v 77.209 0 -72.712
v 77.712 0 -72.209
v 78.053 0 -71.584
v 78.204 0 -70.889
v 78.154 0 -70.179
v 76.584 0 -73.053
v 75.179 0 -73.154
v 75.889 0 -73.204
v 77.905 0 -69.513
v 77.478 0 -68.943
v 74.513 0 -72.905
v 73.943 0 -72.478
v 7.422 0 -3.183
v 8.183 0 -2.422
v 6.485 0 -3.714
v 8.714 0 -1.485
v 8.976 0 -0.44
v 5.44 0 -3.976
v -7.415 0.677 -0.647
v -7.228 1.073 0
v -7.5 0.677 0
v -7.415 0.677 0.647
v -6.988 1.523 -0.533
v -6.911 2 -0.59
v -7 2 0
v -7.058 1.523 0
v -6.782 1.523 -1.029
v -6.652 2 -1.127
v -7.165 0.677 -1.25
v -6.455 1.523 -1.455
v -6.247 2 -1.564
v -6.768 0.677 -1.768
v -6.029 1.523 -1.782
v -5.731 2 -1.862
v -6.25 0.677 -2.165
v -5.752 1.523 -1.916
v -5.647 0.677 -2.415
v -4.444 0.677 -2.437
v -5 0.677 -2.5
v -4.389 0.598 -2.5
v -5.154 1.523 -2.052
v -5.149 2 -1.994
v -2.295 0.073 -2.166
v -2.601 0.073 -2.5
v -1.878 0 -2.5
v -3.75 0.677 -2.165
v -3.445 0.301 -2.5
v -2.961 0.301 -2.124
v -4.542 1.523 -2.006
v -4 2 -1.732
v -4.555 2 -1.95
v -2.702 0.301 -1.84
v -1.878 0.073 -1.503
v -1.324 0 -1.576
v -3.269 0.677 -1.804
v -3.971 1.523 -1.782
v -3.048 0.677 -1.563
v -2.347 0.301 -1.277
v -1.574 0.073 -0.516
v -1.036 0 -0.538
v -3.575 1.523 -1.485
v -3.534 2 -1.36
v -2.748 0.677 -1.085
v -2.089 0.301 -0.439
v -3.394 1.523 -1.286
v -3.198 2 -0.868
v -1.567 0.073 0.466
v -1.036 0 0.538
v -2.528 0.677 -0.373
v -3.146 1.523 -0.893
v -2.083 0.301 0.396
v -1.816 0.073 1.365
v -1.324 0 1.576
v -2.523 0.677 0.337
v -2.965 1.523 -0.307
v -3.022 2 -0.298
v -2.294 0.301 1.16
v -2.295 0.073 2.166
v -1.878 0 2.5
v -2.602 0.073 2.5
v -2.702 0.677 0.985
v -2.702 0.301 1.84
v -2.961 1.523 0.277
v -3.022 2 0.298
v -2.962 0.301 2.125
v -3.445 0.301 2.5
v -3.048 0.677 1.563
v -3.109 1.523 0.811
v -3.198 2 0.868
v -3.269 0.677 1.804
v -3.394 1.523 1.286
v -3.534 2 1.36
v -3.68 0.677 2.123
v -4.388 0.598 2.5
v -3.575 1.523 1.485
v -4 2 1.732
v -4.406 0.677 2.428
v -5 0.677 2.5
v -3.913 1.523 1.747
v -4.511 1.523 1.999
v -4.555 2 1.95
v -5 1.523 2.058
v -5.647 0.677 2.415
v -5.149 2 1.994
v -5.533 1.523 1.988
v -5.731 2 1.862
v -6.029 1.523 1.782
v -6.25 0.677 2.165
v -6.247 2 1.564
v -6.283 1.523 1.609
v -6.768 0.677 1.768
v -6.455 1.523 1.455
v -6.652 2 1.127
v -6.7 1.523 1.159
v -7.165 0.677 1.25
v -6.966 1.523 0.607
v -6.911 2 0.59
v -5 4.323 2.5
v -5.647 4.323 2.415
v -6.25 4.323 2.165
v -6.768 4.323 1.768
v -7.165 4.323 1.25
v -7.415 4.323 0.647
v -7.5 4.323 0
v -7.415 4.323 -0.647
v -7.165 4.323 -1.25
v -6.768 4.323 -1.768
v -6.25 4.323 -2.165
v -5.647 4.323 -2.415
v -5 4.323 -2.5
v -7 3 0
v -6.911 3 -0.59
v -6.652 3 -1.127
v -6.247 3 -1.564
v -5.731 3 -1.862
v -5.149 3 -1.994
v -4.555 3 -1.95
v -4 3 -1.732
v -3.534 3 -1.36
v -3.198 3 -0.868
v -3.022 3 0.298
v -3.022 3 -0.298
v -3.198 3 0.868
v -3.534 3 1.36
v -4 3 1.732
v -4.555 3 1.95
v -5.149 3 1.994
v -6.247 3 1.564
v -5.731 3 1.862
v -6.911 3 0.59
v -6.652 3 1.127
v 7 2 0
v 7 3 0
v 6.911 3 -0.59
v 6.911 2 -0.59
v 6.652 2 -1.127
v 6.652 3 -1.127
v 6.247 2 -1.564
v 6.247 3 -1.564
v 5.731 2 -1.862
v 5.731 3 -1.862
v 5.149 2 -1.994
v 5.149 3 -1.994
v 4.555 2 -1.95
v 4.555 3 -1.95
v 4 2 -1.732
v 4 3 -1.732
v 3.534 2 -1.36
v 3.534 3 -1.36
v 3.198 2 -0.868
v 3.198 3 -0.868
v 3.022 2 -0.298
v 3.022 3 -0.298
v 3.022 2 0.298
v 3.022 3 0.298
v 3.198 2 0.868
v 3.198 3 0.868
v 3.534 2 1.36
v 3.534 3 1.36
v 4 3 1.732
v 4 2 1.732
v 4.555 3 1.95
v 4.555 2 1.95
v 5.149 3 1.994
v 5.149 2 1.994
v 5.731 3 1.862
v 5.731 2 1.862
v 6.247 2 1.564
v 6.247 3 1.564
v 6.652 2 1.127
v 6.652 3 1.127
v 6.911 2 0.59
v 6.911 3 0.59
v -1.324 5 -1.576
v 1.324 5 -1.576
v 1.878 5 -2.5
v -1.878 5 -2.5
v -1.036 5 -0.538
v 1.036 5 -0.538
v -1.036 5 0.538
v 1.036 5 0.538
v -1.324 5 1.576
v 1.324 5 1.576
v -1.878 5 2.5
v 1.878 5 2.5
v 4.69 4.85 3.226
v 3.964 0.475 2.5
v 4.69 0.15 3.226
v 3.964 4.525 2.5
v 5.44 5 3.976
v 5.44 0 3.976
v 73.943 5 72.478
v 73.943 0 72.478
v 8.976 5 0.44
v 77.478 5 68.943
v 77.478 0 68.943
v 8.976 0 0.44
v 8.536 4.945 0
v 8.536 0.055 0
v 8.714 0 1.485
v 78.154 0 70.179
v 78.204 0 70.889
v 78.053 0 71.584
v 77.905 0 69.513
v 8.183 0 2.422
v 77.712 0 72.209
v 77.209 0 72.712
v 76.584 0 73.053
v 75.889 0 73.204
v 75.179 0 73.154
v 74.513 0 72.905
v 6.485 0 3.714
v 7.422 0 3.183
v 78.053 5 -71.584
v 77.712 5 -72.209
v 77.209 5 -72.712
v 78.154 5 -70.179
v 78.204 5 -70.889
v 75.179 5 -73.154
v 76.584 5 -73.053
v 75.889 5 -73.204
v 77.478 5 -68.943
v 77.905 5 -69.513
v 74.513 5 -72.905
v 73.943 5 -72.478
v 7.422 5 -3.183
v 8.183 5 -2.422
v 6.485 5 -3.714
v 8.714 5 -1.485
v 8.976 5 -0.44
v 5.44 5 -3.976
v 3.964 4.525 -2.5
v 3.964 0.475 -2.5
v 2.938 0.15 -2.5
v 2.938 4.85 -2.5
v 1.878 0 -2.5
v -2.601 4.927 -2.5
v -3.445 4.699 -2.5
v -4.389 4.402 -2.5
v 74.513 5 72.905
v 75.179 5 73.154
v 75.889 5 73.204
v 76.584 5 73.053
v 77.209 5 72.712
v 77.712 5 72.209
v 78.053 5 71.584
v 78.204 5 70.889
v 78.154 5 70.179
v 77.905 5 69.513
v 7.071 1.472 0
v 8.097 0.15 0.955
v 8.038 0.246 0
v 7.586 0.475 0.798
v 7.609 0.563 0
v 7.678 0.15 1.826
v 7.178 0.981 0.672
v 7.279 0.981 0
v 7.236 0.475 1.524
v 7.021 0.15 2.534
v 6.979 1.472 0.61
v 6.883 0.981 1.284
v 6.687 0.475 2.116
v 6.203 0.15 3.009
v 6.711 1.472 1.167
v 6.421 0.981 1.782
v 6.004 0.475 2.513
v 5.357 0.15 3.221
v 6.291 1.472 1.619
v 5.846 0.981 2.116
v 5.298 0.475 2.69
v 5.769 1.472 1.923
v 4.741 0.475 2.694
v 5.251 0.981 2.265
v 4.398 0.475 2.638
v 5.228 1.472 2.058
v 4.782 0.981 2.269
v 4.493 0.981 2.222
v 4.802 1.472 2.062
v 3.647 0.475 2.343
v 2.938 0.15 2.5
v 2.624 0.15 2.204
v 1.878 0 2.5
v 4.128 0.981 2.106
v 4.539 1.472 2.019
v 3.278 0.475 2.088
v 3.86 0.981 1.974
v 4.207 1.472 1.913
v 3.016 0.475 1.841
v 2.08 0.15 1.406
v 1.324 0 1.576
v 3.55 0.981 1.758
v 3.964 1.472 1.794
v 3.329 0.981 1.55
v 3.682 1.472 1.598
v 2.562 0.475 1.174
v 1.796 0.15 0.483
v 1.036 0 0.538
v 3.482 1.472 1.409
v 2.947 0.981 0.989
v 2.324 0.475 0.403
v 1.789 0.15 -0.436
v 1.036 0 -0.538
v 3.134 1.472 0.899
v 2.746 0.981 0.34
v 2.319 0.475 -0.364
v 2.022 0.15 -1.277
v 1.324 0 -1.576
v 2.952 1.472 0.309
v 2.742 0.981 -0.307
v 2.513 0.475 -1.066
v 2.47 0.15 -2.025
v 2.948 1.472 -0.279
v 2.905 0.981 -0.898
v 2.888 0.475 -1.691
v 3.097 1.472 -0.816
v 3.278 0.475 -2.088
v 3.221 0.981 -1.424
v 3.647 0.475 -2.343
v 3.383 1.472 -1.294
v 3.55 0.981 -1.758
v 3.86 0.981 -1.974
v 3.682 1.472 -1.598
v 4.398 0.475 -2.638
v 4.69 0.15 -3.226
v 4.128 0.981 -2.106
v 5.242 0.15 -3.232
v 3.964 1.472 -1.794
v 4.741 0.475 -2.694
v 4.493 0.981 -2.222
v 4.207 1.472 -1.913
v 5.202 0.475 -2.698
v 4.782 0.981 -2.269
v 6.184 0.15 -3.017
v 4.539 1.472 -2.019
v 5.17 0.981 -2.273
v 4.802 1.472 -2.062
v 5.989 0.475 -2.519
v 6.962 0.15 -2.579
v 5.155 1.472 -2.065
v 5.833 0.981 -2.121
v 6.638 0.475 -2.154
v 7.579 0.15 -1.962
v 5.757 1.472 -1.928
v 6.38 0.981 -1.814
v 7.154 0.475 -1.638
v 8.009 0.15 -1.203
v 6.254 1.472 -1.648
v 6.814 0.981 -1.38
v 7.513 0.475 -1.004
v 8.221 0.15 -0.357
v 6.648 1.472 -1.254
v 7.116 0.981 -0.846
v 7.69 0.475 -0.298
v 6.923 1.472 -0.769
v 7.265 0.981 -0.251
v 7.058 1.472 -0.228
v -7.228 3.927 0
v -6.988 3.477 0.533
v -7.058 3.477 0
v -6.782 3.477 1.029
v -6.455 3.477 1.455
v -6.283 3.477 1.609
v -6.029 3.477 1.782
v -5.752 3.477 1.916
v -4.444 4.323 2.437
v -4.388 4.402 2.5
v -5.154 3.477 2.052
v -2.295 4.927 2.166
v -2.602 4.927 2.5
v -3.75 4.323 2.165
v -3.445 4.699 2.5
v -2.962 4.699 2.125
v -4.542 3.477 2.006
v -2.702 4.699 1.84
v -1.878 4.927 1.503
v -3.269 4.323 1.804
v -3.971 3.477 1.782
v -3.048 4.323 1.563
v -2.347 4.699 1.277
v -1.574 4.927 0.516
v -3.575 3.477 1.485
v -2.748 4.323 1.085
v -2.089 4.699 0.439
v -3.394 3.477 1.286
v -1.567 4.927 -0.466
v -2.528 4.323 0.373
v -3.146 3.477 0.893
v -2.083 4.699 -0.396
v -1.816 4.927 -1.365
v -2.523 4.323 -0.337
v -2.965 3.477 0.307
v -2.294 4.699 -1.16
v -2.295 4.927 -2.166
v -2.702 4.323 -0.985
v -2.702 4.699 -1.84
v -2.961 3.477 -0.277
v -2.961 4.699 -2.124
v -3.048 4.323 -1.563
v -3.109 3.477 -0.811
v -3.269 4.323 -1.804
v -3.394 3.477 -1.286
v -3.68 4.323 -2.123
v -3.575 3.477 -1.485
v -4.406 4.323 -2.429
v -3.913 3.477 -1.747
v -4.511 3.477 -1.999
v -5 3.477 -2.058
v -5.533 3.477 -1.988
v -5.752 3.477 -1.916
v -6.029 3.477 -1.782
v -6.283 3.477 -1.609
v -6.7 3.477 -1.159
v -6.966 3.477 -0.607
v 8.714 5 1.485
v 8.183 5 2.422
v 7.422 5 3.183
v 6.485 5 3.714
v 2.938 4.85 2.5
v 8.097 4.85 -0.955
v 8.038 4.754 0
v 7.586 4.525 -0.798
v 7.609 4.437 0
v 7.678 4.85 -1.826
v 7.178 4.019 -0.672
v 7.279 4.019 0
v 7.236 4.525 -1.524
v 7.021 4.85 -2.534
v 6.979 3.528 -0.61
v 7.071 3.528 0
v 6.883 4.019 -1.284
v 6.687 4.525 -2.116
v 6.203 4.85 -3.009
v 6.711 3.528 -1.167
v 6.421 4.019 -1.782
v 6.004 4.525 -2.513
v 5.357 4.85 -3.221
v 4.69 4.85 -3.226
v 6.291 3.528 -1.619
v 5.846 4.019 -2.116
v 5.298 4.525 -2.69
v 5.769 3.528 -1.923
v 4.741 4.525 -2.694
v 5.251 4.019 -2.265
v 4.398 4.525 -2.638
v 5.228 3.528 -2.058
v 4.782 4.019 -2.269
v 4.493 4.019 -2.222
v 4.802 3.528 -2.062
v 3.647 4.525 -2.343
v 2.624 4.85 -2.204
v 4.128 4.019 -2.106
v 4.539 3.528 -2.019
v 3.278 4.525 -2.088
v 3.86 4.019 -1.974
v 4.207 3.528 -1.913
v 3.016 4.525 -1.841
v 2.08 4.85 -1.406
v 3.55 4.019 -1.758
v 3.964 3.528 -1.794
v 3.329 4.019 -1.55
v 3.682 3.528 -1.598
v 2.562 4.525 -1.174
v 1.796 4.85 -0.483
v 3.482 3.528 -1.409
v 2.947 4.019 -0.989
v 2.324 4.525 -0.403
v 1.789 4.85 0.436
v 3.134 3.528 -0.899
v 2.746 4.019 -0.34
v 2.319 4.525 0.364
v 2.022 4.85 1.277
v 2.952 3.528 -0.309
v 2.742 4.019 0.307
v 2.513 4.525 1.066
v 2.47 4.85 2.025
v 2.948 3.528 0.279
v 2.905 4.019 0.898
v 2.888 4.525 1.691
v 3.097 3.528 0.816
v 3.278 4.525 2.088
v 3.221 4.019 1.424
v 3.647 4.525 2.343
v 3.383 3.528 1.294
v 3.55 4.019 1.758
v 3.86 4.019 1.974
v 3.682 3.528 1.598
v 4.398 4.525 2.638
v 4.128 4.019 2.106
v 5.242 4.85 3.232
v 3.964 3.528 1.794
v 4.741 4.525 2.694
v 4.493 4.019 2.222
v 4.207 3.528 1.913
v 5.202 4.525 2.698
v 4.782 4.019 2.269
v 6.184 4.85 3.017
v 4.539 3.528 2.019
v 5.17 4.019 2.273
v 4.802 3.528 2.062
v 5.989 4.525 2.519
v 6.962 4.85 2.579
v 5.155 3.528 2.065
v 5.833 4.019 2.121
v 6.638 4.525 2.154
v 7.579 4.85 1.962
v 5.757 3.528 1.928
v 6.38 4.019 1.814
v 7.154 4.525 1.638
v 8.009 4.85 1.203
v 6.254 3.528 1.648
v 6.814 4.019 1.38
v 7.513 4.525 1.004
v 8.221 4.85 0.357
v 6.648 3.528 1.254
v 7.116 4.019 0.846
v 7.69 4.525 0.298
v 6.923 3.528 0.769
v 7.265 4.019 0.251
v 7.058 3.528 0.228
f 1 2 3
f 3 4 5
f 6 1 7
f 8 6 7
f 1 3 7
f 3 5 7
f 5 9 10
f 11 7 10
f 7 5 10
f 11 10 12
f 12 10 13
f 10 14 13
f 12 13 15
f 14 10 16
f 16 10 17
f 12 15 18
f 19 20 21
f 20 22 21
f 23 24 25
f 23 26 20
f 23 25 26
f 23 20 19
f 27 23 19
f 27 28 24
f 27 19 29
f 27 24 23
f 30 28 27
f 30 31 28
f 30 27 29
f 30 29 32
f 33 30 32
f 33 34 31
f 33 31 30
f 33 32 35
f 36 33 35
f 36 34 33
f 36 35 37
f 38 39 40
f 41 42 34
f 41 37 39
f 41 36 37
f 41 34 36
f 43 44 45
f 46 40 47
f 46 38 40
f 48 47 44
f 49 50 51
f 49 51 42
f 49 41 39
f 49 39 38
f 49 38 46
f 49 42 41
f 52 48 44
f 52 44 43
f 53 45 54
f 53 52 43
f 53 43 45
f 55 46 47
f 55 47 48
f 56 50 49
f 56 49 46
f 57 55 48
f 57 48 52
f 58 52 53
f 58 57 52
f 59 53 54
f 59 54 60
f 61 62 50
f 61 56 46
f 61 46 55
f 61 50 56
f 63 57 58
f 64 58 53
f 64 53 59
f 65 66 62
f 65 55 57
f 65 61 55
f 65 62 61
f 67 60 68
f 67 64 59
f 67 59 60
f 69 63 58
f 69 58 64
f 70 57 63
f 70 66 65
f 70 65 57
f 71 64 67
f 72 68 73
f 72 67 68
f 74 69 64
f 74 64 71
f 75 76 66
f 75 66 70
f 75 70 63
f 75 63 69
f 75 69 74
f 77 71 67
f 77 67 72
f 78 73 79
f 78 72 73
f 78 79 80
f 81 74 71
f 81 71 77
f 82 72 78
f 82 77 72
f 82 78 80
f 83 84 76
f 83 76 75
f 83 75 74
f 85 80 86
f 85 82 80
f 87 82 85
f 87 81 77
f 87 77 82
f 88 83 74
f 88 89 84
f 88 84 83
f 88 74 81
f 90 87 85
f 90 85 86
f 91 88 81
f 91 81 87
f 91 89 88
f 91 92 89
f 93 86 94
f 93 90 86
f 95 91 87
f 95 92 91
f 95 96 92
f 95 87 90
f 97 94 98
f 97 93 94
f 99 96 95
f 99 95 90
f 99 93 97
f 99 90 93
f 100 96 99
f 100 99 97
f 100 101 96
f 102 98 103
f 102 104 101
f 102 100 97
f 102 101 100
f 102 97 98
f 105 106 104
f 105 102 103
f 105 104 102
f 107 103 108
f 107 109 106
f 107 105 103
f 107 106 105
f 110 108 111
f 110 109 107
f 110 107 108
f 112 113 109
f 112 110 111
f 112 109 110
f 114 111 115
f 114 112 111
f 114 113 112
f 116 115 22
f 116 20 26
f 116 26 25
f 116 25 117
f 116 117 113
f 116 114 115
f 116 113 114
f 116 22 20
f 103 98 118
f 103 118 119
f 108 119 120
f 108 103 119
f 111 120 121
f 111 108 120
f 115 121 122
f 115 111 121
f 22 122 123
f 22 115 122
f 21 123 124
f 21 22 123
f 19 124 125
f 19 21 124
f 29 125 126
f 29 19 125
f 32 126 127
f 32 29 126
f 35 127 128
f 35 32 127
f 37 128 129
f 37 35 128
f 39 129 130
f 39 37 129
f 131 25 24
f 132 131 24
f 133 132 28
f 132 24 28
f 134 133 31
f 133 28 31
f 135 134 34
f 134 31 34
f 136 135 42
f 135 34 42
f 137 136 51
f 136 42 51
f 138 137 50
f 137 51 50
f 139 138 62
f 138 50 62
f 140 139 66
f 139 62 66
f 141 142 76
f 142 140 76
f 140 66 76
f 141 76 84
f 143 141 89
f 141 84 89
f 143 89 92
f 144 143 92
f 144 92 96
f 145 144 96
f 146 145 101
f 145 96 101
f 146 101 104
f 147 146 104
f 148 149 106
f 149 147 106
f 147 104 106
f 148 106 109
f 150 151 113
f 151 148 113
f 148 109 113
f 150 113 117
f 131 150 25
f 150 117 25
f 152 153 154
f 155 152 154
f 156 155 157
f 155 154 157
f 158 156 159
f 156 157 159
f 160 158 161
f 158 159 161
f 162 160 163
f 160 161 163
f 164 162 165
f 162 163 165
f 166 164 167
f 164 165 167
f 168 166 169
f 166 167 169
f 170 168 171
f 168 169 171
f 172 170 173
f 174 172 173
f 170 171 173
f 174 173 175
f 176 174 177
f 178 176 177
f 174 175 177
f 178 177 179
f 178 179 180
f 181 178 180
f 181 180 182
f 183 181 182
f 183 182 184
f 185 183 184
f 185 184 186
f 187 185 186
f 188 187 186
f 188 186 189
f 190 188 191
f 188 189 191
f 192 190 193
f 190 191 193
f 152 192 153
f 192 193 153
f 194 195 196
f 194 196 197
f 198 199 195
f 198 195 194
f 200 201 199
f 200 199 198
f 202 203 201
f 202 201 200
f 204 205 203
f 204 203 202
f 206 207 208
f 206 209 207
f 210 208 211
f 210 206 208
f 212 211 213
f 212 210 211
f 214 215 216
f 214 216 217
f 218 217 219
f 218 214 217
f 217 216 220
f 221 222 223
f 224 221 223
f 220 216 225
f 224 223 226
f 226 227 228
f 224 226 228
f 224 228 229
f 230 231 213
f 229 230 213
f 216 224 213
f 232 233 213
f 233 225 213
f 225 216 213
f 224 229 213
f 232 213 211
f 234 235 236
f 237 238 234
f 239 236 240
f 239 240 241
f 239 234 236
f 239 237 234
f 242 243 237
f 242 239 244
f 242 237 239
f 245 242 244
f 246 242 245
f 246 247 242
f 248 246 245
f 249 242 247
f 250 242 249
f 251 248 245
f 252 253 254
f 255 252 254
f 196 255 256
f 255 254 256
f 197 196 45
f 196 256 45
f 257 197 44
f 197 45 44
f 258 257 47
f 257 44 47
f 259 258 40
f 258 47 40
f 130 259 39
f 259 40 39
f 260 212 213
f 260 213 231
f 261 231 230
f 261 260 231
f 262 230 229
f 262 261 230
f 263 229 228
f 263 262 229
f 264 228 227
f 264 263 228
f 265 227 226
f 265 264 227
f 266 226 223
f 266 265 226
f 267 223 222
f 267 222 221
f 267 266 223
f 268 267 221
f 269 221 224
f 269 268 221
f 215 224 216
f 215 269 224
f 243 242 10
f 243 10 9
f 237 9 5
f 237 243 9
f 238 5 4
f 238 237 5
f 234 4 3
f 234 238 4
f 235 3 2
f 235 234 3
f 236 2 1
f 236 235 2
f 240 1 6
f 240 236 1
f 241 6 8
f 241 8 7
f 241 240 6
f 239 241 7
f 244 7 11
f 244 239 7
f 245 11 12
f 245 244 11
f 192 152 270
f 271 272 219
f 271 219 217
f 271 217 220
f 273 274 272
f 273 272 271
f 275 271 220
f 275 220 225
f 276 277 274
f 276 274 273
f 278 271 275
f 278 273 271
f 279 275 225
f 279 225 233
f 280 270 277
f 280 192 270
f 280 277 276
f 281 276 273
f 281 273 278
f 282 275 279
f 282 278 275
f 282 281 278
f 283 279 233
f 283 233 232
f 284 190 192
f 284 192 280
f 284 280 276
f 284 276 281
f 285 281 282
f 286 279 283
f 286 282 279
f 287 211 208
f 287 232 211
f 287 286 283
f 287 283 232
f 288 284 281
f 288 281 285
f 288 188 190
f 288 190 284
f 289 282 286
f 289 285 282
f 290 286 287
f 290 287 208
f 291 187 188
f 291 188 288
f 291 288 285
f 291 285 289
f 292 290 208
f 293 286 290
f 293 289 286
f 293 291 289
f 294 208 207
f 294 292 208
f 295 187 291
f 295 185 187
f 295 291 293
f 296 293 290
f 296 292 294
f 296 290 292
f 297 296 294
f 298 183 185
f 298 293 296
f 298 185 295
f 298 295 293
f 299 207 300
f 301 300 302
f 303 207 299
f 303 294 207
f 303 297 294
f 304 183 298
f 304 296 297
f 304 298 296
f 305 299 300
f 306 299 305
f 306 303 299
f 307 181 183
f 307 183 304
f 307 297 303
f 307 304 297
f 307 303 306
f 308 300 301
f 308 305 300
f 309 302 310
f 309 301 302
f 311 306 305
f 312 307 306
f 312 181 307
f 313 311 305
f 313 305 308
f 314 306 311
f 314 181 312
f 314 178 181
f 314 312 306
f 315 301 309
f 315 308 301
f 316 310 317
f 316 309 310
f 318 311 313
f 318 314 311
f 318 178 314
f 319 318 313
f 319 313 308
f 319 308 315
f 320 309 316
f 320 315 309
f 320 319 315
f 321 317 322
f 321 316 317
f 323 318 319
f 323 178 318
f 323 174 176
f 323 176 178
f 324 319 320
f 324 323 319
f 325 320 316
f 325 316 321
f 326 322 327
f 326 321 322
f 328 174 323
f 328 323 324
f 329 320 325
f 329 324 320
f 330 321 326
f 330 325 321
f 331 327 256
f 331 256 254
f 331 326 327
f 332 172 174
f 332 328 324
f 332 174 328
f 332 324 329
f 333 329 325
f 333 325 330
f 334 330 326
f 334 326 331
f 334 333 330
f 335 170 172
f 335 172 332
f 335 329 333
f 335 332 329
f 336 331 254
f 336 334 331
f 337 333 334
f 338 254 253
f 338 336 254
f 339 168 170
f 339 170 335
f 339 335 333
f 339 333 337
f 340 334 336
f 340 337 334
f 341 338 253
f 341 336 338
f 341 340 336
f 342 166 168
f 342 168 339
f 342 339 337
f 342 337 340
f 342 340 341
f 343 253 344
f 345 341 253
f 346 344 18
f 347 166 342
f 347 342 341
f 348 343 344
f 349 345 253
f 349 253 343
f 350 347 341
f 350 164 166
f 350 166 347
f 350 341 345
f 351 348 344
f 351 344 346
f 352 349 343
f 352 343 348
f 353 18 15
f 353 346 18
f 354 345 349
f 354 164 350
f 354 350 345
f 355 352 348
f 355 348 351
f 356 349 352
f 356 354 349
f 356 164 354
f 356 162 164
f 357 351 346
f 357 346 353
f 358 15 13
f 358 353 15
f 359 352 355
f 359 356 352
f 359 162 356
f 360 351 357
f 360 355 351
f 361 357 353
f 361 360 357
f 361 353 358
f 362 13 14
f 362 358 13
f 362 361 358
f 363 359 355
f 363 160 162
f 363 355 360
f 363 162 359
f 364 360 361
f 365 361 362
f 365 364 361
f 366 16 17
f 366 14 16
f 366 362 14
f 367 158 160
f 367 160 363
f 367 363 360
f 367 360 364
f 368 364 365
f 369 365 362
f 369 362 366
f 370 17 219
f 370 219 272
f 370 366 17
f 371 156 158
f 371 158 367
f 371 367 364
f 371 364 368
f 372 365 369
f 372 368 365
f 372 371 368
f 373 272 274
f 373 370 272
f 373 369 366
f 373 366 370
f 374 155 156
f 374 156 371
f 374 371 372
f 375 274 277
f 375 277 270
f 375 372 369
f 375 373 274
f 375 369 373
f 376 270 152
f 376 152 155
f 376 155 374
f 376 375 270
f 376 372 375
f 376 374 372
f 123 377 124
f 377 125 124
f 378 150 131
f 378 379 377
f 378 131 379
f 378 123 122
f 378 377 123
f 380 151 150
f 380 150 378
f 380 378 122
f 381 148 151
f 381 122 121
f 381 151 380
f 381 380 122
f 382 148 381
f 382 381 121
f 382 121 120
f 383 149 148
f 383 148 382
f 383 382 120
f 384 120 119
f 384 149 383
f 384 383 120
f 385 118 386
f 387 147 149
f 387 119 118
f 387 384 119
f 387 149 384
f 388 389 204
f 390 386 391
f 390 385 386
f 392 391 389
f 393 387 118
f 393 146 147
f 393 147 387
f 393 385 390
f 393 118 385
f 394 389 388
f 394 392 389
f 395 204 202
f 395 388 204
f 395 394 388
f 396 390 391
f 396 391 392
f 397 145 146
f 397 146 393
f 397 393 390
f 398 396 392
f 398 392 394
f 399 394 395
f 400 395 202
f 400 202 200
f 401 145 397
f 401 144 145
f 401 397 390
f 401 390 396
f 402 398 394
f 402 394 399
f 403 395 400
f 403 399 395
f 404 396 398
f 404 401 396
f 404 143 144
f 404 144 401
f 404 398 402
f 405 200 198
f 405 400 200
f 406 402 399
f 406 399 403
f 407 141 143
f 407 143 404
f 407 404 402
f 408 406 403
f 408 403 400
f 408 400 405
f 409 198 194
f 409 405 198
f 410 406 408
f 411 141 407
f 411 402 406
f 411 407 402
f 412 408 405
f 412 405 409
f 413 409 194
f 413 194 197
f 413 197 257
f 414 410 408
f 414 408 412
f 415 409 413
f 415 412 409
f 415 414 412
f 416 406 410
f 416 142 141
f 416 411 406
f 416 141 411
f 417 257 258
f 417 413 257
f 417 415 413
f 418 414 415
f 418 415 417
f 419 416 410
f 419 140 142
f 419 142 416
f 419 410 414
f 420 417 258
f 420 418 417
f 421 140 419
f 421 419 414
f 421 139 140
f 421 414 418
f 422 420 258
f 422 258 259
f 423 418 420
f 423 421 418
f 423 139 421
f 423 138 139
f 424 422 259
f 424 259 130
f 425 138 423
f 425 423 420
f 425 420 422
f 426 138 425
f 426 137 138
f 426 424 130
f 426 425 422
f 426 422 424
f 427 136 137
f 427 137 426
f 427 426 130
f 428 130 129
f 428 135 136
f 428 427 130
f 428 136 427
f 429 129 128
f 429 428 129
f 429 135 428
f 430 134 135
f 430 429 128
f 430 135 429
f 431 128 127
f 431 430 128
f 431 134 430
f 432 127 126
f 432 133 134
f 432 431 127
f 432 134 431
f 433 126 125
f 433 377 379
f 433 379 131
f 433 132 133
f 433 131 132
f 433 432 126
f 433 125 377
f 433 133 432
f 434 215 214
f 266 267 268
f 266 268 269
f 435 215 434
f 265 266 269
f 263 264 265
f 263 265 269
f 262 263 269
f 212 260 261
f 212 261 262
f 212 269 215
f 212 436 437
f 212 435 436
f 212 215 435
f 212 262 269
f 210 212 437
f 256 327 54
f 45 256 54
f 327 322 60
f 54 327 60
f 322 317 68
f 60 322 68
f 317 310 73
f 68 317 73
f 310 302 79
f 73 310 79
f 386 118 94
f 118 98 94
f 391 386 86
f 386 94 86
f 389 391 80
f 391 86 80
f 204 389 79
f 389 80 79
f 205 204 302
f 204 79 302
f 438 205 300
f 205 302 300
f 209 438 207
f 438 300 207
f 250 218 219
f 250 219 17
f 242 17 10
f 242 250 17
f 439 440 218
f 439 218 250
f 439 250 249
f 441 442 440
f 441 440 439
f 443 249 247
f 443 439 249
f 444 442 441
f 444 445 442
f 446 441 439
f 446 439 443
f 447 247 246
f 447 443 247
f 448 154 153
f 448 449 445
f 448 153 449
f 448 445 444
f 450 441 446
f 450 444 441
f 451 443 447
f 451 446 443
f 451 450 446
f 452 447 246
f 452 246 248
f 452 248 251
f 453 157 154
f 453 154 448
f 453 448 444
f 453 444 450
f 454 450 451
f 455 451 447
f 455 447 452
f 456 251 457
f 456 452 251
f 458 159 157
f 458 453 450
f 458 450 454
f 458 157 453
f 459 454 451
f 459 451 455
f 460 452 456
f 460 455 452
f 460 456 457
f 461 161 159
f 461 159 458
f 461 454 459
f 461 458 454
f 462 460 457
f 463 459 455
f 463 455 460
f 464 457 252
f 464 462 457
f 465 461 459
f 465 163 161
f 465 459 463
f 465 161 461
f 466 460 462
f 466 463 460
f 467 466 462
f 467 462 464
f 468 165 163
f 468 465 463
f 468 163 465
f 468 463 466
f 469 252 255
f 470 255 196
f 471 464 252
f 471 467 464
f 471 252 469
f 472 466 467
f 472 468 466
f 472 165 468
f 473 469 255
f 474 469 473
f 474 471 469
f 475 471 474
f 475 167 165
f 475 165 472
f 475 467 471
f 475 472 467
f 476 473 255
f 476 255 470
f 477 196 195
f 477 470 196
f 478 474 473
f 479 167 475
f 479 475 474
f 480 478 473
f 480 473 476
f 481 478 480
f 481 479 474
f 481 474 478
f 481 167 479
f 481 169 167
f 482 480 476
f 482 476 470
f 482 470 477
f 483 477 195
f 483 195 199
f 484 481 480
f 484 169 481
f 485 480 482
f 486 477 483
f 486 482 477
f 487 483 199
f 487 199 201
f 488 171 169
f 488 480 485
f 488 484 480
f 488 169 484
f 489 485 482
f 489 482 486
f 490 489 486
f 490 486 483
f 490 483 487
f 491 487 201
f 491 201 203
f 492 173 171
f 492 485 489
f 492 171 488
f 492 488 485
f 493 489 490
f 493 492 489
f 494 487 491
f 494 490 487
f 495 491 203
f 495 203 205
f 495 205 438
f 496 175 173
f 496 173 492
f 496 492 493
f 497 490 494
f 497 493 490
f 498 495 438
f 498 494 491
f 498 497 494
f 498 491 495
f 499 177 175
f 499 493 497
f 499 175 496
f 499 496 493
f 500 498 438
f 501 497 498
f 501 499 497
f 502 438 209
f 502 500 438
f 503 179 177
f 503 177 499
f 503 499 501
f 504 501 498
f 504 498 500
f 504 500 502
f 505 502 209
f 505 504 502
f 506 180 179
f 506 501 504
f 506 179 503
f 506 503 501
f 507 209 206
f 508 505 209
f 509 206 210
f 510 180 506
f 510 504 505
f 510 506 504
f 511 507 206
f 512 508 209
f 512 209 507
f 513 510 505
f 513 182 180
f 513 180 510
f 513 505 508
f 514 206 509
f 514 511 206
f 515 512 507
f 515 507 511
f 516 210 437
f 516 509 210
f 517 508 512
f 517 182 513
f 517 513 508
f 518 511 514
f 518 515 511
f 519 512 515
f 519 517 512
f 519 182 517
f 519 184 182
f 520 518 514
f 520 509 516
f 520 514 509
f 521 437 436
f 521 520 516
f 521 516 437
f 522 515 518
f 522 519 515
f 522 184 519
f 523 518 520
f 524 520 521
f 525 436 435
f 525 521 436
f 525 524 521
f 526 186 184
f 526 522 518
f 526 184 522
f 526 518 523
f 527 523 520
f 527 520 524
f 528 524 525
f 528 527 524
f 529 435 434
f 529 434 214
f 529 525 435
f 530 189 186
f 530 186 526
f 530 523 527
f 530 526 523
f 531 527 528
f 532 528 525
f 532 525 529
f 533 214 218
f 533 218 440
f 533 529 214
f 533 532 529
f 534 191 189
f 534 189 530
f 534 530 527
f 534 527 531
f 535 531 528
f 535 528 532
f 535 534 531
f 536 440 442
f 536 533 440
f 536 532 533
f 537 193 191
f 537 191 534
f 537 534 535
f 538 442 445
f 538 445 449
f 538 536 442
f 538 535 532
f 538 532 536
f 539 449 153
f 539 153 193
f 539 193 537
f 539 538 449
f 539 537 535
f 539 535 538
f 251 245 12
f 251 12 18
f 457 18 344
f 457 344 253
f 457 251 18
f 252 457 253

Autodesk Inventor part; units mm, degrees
ref_plane "YZ Plane" through (0, 0, 0) normal (1, 0, 0) x (0, 1, 0)
ref_plane "XZ Plane" through (0, 0, 0) normal (0, 1, 0) x (-1, 0, 0)
ref_plane "XY Plane" through (0, 0, 0) normal (0, 0, 1) x (1, 0, 0)
sketch "草图2" plane through (0, 0, 0) normal (0, 1, 0) x (-1, 0, 0)
  line L0 (5, 0) -> (-5, 0) construction
  line L1 (5, 2.5) -> (-5, 2.5)
  line L2 (-5, -2.5) -> (5, -2.5)
  arc A0 (5, -2.5) -> (5, 2.5) centre (5, 0) ccw
  arc A1 (-5, 2.5) -> (-5, -2.5) centre (-5, 0) ccw
  line L3 (5, 0) -> (15, 0) construction
  circle A2 centre (5, 0) radius 2
  circle A3 centre (-5, 0) radius 2
  point P0 (0, 0)
  point P1 (0, 0)
  dimension "d6" = 10
  dimension "d7" = 180
  dimension "d8" = 5
  dimension "d9" = 4
  dimension "d10" = 4
extrude "拉伸1" add sketch "草图2" along normal blind 5
sketch "草图3" plane through (0, 5, 0) normal (0, 1, 0) x (1, 0, 0)
  line L0 (5, 0) -> (75.7107, 70.7107) construction
  line L1 (6.7678, -1.7678) -> (77.4784, 68.9429)
  line L2 (73.9429, 72.4784) -> (3.2322, 1.7678)
  arc A0 (3.2322, 1.7678) -> (6.7678, -1.7678) centre (5, 0) ccw
  arc A1 (77.4784, 68.9429) -> (73.9429, 72.4784) centre (75.7107, 70.7107) ccw
  line L3 (5, 0) -> (105, 0) construction
  line L4 (5, 0) -> (75.7107, -70.7107) construction
  line L5 (3.2322, -1.7678) -> (73.9429, -72.4784)
  line L6 (77.4784, -68.9429) -> (6.7678, 1.7678)
  arc A2 (6.7678, 1.7678) -> (3.2322, -1.7678) centre (5, 0) ccw
  arc A3 (73.9429, -72.4784) -> (77.4784, -68.9429) centre (75.7107, -70.7107) ccw
  line L7 (5, 0) -> (105, 0) construction
  point P0 (0, 0)
  point P1 (40.3553, 35.3553)
  point P2 (40.3553, -35.3553)
  dimension "d13" = 100
  dimension "d14" = 45
  dimension "d15" = 5
  dimension "d16" = 100
  dimension "d17" = 45
  dimension "d18" = 5
extrude "拉伸2" add sketch "草图3" against normal blind 5
sketch "草图4" plane through (0, 5, 0) normal (0, 1, 0) x (1, 0, 0)
  circle A0 centre (5, 0) radius 2
  point P0 (0, 0)
  dimension "d21" = 4
extrude "拉伸3" cut sketch "草图4" against normal through all
fillet "圆角1" radius 2 4 edges at (3, 0, 0) (3, 5, 0) (-3, 5, 0) (-3, 0, 0)
properties part number "压缩杆"
